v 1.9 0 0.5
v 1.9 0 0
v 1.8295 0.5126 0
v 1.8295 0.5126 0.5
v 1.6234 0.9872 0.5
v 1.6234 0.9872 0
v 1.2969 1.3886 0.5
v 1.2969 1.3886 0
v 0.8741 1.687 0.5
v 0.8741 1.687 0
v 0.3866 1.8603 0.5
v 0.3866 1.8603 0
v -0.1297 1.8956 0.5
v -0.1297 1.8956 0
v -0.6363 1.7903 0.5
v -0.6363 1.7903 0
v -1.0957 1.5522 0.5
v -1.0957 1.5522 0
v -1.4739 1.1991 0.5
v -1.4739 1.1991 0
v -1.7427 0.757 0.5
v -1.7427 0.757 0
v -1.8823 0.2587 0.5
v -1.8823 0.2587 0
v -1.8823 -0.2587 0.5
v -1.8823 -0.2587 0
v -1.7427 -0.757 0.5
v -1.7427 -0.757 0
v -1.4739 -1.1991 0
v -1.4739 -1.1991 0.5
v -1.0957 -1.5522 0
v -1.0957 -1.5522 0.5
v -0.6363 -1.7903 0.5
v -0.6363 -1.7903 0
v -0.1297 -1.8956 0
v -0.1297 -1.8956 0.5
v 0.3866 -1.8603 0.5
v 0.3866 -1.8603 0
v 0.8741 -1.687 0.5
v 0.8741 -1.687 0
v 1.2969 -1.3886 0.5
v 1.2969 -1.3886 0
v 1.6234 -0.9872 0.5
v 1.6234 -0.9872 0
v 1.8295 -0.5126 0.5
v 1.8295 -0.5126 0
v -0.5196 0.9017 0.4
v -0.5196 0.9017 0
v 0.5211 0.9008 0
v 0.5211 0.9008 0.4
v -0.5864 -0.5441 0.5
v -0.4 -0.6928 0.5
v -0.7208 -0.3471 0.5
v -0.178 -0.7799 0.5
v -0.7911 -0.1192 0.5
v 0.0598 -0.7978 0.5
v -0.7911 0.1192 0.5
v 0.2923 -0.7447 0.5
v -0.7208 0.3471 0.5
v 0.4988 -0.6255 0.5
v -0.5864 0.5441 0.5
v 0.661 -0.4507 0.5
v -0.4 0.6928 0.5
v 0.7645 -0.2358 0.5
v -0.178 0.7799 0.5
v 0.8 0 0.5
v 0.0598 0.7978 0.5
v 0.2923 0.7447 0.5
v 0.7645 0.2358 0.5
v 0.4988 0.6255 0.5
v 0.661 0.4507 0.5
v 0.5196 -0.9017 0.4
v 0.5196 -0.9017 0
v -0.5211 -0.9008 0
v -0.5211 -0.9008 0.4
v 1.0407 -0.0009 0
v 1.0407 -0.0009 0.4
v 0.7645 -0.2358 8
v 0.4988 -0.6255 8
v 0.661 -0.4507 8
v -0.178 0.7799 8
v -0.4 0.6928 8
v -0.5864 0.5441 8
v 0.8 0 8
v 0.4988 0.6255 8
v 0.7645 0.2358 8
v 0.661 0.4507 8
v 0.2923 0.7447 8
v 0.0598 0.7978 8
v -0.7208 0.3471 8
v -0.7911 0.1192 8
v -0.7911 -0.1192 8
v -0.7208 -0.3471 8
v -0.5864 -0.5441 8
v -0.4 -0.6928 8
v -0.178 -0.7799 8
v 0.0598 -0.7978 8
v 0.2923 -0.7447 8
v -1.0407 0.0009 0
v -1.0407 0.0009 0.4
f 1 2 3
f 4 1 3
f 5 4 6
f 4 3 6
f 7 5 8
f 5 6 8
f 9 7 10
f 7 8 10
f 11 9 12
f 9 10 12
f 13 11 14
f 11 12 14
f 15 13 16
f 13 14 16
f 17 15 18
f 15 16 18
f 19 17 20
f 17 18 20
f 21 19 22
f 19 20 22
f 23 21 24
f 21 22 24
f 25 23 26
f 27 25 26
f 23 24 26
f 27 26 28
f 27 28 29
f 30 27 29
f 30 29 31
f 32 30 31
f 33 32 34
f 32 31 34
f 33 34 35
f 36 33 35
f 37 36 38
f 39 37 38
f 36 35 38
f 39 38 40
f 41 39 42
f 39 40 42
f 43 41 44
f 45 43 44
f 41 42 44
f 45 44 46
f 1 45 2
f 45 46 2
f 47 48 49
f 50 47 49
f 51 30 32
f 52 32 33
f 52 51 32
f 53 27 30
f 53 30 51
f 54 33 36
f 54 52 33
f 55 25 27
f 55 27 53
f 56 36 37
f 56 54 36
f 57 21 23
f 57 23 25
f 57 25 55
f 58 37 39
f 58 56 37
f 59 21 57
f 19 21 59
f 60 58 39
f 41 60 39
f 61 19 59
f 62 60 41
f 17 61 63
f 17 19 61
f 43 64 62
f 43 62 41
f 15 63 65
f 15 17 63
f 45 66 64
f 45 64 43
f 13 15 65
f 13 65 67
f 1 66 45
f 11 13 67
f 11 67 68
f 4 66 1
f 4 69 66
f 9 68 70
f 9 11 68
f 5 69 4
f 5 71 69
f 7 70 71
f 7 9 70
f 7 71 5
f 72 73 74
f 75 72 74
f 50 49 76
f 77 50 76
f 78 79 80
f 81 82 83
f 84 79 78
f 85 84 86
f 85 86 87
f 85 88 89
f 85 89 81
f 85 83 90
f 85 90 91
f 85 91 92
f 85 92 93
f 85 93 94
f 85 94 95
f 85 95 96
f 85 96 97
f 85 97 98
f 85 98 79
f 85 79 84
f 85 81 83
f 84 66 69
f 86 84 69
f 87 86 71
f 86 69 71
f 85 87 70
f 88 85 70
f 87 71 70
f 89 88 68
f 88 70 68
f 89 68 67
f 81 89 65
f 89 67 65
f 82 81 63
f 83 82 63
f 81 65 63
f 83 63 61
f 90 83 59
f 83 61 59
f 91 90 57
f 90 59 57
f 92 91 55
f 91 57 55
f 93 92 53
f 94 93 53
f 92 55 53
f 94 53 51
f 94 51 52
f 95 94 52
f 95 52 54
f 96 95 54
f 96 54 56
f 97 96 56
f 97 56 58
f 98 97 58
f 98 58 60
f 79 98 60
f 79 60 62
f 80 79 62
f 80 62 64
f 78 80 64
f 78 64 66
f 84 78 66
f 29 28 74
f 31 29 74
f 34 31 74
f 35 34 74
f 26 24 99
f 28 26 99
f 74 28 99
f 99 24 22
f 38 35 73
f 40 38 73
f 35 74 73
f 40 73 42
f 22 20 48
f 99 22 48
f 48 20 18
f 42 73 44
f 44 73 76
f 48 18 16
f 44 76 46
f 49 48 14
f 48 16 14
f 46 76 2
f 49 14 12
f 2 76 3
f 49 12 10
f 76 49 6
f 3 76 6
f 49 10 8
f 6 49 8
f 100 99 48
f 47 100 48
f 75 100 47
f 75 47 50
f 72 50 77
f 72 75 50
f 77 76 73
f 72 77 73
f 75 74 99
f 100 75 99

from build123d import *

# Parameters (mm, degrees)
F0_R     = 0.8
F1_DEPTH = 8
F0_R_2   = 1.9
F2_DEPTH = 0.5
F4_DEPTH = 0.4


with BuildPart() as f1:
    # F0 (on Top) → F1 (new body)
    with BuildSketch(Plane.XY):
        Circle(F0_R)
    extrude(amount=F1_DEPTH)

    # F0 (on Top) → F2 (join)
    with BuildSketch(Plane.XY):
        Circle(F0_R_2)
        Circle(F0_R, mode=Mode.SUBTRACT)
    extrude(amount=F2_DEPTH)

    # F3 (on face) → F4 (cut)
    with BuildSketch(Plane(origin=(0, 0, 0), x_dir=(1, 0, 0), z_dir=(0, 0, -1))):
        Polygon((0.521101, -0.900798), (1.040665, 0.000888), (0.519563, 0.901686), (-0.521101, 0.900798), (-1.040665, -0.000888), (-0.519563, -0.901686), align=None)
    extrude(amount=-F4_DEPTH, mode=Mode.SUBTRACT)


solid = f1.part
